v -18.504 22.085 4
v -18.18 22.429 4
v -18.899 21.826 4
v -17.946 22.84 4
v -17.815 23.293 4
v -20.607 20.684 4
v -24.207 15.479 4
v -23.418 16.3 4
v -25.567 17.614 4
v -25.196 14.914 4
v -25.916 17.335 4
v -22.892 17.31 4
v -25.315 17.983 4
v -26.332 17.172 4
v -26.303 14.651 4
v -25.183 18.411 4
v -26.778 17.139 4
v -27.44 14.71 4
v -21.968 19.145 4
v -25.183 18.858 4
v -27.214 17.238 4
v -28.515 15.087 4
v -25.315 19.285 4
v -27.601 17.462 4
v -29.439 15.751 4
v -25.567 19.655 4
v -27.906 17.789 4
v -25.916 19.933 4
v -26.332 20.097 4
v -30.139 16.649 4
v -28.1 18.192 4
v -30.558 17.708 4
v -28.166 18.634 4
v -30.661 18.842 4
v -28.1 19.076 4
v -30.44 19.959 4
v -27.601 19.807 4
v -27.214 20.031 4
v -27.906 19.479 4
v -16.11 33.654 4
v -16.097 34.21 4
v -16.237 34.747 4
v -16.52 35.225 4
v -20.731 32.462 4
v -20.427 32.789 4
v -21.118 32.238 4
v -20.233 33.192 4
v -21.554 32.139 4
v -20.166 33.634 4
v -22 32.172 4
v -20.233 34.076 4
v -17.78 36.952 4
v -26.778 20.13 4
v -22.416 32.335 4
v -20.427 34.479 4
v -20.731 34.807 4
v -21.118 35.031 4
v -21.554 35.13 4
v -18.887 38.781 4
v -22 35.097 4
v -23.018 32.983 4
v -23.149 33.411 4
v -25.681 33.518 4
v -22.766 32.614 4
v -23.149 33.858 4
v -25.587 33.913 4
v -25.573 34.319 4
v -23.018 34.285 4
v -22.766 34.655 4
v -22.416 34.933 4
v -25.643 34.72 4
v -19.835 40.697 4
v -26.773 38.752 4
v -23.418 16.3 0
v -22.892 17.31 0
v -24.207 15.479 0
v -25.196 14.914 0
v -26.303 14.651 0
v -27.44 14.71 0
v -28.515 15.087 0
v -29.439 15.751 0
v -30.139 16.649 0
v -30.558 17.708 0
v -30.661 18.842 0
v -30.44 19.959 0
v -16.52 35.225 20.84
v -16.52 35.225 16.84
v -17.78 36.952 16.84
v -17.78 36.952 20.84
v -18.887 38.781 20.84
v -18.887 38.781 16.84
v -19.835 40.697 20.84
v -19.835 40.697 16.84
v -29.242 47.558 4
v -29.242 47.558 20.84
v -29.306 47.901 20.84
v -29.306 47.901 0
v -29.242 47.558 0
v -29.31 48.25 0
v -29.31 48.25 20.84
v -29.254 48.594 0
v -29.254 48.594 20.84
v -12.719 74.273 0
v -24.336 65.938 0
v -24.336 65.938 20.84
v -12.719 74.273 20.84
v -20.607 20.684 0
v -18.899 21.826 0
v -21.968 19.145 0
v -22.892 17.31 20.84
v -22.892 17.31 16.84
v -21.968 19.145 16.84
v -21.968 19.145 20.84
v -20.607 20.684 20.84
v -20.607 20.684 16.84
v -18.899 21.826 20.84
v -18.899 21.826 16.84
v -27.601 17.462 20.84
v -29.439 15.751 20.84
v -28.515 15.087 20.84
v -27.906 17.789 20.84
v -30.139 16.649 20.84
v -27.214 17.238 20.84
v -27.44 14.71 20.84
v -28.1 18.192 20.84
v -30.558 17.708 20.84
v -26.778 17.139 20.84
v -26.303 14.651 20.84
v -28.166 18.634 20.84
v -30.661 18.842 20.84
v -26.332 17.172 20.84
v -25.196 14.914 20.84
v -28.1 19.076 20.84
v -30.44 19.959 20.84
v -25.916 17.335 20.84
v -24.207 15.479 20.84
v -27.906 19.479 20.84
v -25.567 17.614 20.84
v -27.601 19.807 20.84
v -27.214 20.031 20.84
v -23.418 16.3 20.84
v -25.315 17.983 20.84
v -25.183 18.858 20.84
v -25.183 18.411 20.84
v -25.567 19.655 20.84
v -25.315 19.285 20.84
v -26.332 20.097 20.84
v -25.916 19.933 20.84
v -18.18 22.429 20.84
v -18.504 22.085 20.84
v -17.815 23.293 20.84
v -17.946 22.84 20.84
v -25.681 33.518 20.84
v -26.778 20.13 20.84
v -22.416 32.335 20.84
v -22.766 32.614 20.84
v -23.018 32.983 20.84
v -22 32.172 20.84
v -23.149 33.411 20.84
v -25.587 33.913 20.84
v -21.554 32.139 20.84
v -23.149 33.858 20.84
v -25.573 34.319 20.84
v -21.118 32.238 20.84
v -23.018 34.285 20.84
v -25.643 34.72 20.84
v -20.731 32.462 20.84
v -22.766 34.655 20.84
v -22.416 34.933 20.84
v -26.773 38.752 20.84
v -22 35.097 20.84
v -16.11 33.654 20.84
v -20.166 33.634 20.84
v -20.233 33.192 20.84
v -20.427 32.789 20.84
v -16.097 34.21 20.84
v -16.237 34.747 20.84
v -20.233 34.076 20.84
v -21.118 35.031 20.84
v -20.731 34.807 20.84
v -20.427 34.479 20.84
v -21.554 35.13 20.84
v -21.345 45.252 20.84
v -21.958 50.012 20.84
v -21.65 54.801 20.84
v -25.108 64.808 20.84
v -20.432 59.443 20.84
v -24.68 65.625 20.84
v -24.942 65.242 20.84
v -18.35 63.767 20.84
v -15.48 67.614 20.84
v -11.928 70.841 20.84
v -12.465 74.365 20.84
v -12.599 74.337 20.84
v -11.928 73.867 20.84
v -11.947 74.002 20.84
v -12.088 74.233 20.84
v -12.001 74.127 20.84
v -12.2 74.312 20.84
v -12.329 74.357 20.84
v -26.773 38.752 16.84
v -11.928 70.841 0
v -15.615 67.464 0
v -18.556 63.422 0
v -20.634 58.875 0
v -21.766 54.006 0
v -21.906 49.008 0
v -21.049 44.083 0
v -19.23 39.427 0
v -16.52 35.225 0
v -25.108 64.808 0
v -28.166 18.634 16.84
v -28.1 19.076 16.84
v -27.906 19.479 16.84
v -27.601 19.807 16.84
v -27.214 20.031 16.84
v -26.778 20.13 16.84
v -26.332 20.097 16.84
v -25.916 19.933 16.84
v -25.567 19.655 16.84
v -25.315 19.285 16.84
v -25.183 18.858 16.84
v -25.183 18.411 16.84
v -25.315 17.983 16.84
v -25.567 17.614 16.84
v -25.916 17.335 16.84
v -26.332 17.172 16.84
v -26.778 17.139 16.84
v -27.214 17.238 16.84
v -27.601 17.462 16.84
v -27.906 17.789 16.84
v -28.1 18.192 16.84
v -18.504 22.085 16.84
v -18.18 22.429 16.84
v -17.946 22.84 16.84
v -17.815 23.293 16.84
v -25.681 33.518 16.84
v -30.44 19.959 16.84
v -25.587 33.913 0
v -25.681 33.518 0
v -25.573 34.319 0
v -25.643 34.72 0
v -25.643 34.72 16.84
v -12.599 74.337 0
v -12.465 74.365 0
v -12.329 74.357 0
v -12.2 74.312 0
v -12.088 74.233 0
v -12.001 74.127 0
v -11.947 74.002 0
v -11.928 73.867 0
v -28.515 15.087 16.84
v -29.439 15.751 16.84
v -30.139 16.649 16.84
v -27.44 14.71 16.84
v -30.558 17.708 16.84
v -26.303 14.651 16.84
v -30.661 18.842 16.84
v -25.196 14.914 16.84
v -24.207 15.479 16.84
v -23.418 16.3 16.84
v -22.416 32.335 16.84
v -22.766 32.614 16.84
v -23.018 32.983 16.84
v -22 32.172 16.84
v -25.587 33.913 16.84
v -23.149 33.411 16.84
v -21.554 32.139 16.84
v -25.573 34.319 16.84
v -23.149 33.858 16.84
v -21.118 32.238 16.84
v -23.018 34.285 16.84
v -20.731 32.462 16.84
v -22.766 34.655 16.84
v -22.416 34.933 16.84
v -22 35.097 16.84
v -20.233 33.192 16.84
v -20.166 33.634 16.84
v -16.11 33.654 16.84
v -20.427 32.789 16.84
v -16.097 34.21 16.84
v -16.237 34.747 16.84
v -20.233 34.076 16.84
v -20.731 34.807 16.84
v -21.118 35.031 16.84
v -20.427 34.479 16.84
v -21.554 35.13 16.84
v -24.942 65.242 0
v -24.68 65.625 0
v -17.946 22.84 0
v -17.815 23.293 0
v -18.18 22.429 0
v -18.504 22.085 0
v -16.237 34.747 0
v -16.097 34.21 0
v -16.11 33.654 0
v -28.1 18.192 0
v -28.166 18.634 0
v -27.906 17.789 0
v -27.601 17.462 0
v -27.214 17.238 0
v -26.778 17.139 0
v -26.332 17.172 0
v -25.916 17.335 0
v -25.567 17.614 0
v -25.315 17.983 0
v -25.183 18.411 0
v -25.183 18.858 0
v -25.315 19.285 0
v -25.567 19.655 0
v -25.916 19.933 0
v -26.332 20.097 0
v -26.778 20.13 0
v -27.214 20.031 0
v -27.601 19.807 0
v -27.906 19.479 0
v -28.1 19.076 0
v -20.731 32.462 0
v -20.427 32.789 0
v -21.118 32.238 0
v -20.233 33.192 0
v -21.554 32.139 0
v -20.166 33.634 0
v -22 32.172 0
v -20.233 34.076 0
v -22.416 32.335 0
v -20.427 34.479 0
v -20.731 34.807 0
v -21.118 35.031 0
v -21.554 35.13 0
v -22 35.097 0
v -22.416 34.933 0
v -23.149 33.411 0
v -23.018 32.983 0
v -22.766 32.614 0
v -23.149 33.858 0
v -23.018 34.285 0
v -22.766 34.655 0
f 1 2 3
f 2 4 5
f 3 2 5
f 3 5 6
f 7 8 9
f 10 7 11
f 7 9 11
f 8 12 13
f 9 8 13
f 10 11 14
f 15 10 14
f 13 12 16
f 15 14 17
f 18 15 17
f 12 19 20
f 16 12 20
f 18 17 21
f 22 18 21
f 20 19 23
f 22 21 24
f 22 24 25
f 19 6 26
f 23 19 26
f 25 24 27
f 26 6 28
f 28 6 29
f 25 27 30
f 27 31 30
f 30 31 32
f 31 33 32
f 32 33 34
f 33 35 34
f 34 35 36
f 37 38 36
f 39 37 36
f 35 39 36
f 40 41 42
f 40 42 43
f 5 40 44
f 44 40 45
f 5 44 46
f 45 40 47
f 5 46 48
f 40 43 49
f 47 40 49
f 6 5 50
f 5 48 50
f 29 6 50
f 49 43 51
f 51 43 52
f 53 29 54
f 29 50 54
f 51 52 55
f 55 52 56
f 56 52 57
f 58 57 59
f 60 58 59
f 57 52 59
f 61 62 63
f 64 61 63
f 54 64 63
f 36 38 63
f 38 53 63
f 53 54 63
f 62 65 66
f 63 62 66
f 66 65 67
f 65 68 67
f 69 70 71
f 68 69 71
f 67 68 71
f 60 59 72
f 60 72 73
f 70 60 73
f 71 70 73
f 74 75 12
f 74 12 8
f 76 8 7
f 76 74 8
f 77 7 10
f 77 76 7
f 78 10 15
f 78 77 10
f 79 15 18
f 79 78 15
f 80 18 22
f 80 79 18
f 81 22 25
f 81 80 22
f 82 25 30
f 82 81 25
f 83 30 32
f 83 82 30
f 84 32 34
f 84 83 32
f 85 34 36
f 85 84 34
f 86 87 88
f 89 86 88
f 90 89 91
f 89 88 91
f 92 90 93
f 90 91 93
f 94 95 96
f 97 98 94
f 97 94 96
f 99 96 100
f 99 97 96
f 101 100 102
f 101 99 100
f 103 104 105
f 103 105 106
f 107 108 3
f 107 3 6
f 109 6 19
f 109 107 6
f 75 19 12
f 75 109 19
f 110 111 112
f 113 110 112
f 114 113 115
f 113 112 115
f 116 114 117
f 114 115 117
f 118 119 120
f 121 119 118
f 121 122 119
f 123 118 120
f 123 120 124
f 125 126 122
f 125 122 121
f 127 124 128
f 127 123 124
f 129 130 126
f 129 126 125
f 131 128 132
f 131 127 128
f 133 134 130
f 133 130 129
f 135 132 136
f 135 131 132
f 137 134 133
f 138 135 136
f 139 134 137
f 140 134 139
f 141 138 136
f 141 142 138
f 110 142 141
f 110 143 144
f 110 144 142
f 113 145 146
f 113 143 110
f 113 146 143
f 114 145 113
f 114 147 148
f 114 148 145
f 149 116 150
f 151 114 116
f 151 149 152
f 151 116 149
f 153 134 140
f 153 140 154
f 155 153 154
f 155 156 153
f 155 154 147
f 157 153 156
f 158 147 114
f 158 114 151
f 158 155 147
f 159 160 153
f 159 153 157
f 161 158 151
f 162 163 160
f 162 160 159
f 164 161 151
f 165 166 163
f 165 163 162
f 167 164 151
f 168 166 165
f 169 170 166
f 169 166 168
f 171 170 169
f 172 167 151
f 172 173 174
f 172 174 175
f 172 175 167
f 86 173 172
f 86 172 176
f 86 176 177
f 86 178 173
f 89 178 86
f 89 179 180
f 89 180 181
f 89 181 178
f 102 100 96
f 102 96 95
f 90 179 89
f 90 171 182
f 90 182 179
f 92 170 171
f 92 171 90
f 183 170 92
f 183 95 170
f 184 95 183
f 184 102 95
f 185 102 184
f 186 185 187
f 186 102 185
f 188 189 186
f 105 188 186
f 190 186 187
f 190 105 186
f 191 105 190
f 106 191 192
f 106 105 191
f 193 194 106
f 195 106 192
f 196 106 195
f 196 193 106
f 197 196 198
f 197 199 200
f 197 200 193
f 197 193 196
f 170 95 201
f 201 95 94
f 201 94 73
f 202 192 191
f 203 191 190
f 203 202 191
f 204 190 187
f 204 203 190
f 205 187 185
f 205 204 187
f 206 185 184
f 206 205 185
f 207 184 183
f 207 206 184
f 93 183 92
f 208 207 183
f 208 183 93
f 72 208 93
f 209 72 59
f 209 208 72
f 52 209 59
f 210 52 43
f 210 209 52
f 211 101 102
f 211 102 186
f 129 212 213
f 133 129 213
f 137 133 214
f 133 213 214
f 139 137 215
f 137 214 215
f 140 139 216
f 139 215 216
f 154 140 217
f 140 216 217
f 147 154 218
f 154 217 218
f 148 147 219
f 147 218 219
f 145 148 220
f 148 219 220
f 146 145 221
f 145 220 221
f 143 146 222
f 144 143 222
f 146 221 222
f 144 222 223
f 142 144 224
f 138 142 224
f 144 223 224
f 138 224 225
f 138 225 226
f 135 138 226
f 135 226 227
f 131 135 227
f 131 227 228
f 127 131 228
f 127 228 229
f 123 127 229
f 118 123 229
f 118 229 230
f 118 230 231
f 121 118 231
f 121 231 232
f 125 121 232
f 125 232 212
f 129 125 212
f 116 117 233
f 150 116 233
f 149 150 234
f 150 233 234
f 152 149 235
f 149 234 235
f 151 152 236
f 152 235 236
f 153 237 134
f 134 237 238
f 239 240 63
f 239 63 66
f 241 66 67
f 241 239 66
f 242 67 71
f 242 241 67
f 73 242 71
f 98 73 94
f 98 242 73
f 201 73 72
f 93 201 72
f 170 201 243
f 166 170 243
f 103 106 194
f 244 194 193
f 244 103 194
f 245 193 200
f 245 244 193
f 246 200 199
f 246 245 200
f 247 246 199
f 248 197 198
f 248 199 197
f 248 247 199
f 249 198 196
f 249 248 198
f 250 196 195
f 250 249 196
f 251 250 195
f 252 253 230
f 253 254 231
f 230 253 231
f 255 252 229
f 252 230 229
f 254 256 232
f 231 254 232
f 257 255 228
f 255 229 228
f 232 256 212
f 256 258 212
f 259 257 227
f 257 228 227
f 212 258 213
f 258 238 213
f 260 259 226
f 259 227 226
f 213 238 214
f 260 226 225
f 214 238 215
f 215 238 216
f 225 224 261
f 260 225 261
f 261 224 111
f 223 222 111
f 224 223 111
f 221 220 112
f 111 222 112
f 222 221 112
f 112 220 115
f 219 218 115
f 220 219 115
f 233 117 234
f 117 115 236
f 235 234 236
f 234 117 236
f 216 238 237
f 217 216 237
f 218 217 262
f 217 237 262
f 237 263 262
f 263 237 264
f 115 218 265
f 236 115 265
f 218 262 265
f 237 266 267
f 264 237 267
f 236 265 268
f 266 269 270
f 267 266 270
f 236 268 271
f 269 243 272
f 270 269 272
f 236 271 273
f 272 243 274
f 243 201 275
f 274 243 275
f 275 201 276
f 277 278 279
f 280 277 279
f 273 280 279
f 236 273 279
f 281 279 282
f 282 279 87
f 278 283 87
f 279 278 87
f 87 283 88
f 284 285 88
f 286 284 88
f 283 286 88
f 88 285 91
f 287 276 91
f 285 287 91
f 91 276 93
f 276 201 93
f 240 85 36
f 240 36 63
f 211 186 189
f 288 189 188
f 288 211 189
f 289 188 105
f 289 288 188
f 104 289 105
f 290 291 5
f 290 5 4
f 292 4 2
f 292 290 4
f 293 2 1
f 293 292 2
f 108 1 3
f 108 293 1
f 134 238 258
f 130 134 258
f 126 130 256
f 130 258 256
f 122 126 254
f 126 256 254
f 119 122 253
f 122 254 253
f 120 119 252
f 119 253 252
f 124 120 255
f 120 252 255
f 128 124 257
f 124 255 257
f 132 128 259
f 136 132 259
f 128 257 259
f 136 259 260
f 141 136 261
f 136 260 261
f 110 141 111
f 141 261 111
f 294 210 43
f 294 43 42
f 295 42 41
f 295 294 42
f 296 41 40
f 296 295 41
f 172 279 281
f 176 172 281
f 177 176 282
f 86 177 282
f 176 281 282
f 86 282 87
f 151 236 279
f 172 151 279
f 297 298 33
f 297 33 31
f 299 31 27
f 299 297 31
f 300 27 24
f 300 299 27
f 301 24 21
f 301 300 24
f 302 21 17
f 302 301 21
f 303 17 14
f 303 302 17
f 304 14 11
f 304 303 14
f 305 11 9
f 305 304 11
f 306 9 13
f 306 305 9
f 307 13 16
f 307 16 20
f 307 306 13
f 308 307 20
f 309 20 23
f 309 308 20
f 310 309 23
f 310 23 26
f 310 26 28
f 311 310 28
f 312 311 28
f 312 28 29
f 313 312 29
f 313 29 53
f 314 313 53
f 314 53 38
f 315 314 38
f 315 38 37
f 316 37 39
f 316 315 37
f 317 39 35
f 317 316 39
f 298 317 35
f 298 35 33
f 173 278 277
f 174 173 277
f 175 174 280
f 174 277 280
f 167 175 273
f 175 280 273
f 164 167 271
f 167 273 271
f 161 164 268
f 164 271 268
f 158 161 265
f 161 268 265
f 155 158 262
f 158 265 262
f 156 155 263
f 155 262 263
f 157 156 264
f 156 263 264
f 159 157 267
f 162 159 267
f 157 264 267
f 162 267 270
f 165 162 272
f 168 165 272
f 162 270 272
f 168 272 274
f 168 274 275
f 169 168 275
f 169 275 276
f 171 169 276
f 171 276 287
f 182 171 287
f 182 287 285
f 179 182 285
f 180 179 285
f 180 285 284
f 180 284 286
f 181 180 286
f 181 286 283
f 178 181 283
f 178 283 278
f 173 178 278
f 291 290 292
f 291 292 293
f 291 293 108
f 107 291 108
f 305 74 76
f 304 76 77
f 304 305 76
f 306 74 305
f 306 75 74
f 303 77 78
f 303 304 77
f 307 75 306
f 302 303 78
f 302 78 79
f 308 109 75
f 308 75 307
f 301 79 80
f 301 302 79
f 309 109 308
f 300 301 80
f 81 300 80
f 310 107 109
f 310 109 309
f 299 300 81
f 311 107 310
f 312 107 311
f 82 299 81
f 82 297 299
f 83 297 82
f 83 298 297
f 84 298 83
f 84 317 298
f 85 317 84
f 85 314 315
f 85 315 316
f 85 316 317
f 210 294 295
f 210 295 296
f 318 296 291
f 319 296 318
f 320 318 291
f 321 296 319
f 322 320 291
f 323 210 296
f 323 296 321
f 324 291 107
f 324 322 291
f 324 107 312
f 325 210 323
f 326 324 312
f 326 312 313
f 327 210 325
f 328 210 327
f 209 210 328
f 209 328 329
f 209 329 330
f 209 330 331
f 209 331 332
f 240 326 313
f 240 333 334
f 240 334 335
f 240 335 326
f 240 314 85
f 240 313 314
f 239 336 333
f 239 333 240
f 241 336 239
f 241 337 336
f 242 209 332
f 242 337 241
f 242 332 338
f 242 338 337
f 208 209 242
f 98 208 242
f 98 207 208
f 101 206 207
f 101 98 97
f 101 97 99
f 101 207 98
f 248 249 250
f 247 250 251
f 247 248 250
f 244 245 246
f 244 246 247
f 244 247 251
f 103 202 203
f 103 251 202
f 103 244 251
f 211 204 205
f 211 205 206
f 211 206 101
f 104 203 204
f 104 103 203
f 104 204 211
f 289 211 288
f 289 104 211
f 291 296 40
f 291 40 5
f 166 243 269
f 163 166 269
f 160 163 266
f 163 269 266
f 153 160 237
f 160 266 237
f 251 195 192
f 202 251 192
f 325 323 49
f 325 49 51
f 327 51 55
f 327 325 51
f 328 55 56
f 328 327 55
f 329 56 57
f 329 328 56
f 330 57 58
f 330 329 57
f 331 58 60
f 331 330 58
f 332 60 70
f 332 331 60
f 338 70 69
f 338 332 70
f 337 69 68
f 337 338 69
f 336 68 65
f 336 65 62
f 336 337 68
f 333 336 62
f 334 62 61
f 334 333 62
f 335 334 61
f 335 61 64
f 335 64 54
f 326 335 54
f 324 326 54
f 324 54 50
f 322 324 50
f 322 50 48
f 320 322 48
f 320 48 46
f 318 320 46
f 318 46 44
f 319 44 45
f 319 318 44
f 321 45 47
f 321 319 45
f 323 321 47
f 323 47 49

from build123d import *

# Parameters (mm, degrees)
SKETCH_1_R          = 1.5
EXTRUDE_1_DEPTH     = 4
EXTRUDE_2_DEPTH     = 20.84
EXTRUDE_START       = -4
EXTRUDE_3_DEPTH     = 4
SKETCH_8_R          = 1.5
CUT_EXTRUDE_1_DEPTH = 84.097118968


with BuildPart() as part:
    # 草图1 → 凸台-拉伸1 (new body)
    with BuildSketch(Plane.XY):
        with BuildLine():
            Line((-16.110282893, 33.654208826), (-17.814522763, 23.293438272))
            ThreePointArc((-17.814522763, 23.293438272), (-18.179793181, 22.42908037), (-18.899085656, 21.82645661))
            ThreePointArc((-18.899085656, 21.82645661), (-21.337272658, 19.958522776), (-22.891934151, 17.309568206))
            ThreePointArc((-22.891934151, 17.309568206), (-27.990948412, 14.860061819), (-30.440454799, 19.959076079))
            Line((-30.440454799, 19.959076079), (-25.681476272, 33.517536514))
            ThreePointArc((-25.681476272, 33.517536514), (-25.569637864, 34.115664062), (-25.6428361, 34.719738902))
            Line((-25.6428361, 34.719738902), (-29.24172024, 47.558366666))
            ThreePointArc((-29.24172024, 47.558366666), (-29.31581841, 48.075186607), (-29.253628902, 48.593574353))
            Line((-29.253628902, 48.593574353), (-25.108232608, 64.808221419))
            ThreePointArc((-25.108232608, 64.808221419), (-24.821945701, 65.441071196), (-24.336476636, 65.937839573))
            Line((-24.336476636, 65.937839573), (-12.719407819, 74.272976396))
            ThreePointArc((-12.719407819, 74.272976396), (-12.199607619, 74.311552327), (-11.927927269, 73.866726364))
            Line((-11.927927269, 73.866726364), (-11.927927269, 70.840856193))
            ThreePointArc((-11.927927269, 70.840856193), (-21.765630275, 54.0055336), (-16.519844581, 35.225485153))
            ThreePointArc((-16.519844581, 35.225485153), (-16.148427264, 34.483281689), (-16.110282893, 33.654208826))
        make_face()
        with Locations(Location((-26.666194475, 18.634322143, 0), (0, 0, 180))):
            Circle(SKETCH_1_R, mode=Mode.SUBTRACT)
        with Locations((-21.666194475, 33.634322143)):
            Circle(SKETCH_1_R, mode=Mode.SUBTRACT)
    extrude(amount=EXTRUDE_1_DEPTH)

    # 草图2 → 凸台-拉伸2 (add)
    with BuildSketch(Plane.XY):
        with BuildLine():
            Line((-26.773099146, 38.751829393), (-19.834575078, 40.696814845))
            ThreePointArc((-19.834575078, 40.696814845), (-21.152852216, 57.151552997), (-11.927927269, 70.840856193))
            Line((-11.927927269, 70.840856193), (-11.927927269, 73.866726364))
            ThreePointArc((-11.927927269, 73.866726364), (-12.199607619, 74.311552327), (-12.719407819, 74.272976396))
            Line((-12.719407819, 74.272976396), (-24.336476636, 65.937839573))
            ThreePointArc((-24.336476636, 65.937839573), (-24.821945701, 65.441071196), (-25.108232608, 64.808221419))
            Line((-25.108232608, 64.808221419), (-29.253628902, 48.593574353))
            ThreePointArc((-29.253628902, 48.593574353), (-29.31581841, 48.075186607), (-29.24172024, 47.558366666))
            Line((-29.24172024, 47.558366666), (-26.773099146, 38.751829393))
        make_face()
    extrude(amount=EXTRUDE_2_DEPTH)

    # 草图5 → 凸台-拉伸3 (add)
    with BuildSketch(Plane.XY.offset(20.84).offset(EXTRUDE_START)):
        with BuildLine():
            Line((-19.834575078, 40.696814845), (-26.773099146, 38.751829393))
            Line((-26.773099146, 38.751829393), (-25.6428361, 34.719738902))
            ThreePointArc((-25.6428361, 34.719738902), (-25.569637864, 34.115664062), (-25.681476272, 33.517536514))
            Line((-25.681476272, 33.517536514), (-30.440454799, 19.959076079))
            ThreePointArc((-30.440454799, 19.959076079), (-27.990948412, 14.860061819), (-22.891934151, 17.309568206))
            ThreePointArc((-22.891934151, 17.309568206), (-21.337272658, 19.958522776), (-18.899085656, 21.82645661))
            ThreePointArc((-18.899085656, 21.82645661), (-18.179793181, 22.42908037), (-17.814522763, 23.293438272))
            Line((-17.814522763, 23.293438272), (-16.110282893, 33.654208826))
            ThreePointArc((-16.110282893, 33.654208826), (-16.148427264, 34.483281689), (-16.519844581, 35.225485153))
            ThreePointArc((-16.519844581, 35.225485153), (-18.352935128, 37.854689223), (-19.834575078, 40.696814845))
        make_face()
    extrude(amount=EXTRUDE_3_DEPTH)

    # 草图8 → 切除-拉伸1 (cut, through all)
    with BuildSketch(Plane(origin=(0, 0, 0), x_dir=(-1, 0, 0), z_dir=(0, 0, -1))):
        with Locations(Location((21.666194475, 33.634322143, 0), (0, 0, 180))):
            Circle(SKETCH_8_R)
        with Locations((26.666194475, 18.634322143)):
            Circle(SKETCH_8_R)
    extrude(amount=-CUT_EXTRUDE_1_DEPTH, mode=Mode.SUBTRACT)


solid = part.part
